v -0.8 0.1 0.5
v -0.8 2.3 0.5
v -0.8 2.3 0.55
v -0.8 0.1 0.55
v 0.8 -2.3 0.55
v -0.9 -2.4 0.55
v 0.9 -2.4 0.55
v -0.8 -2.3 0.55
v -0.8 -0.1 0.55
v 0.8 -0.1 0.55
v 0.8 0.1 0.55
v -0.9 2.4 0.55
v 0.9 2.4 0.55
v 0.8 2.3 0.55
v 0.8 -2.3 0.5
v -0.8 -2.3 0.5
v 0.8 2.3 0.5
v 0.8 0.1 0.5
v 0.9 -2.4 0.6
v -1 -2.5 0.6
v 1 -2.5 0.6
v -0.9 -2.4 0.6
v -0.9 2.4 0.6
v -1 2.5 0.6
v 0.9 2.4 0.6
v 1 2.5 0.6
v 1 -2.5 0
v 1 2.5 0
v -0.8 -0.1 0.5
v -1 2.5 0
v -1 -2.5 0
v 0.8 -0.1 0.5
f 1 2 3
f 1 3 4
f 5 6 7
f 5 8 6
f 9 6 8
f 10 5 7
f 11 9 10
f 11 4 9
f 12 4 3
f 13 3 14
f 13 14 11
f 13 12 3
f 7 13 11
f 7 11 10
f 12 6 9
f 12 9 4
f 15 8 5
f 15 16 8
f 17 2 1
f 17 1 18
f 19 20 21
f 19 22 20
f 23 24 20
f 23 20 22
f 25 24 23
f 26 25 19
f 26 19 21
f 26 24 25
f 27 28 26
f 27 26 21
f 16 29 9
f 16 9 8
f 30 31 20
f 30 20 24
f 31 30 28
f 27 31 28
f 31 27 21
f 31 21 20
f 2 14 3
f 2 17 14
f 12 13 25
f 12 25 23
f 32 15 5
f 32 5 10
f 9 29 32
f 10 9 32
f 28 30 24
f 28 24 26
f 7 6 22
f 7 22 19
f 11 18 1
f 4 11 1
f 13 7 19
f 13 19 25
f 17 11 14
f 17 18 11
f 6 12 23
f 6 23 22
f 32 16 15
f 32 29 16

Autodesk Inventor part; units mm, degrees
ref_plane "YZ Plane" through (0, 0, 0) normal (1, 0, 0) x (0, 1, 0)
ref_plane "XZ Plane" through (0, 0, 0) normal (0, 1, 0) x (-1, 0, 0)
ref_plane "XY Plane" through (0, 0, 0) normal (0, 0, 1) x (1, 0, 0)
sketch "草圖1" plane through (0, 0, 0) normal (0, 0, 1) x (1, 0, 0)
  line L0 (-1, 2.5) -> (1, 2.5)
  line L1 (1, 2.5) -> (1, -2.5)
  line L2 (1, -2.5) -> (-1, -2.5)
  line L3 (-1, -2.5) -> (-1, 2.5)
  line L4 (-1, 2.5) -> (1, -2.5) construction
  line L5 (1, 2.5) -> (-1, -2.5) construction
  line L6 (-0.8, -0.1) -> (0.8, -0.1)
  line L7 (1, -0.1) -> (1, 0.1)
  line L8 (0.8, 0.1) -> (-0.8, 0.1)
  line L9 (-1, 0.1) -> (-1, -0.1)
  line L10 (-1, -0.1) -> (1, 0.1) construction
  line L11 (1, -0.1) -> (-1, 0.1) construction
  line L12 (-0.8, -2.3) -> (0.8, -2.3)
  line L13 (0.8, 2.3) -> (-0.8, 2.3)
  line L14 (-0.8, 2.3) -> (0.8, -2.3) construction
  line L15 (-0.8, -2.3) -> (0.8, 2.3) construction
  line L16 (0.8, -2.3) -> (0.8, -0.08)
  line L17 (0.8, 0.08) -> (0.8, 2.3)
  line L18 (-0.8, 2.3) -> (-0.8, 0.08)
  line L19 (-0.8, -0.08) -> (-0.8, -2.3)
  line L20 (-1, -2.5) -> (1, -2.5)
  line L21 (1, -2.5) -> (1, -5.5)
  line L22 (1, -5.5) -> (-1, -5.5)
  line L23 (-1, -5.5) -> (-1, -2.5)
  line L24 (-0.9, -2.4) -> (0.9, -2.4)
  line L25 (0.9, -2.4) -> (0.9, 2.4)
  line L26 (0.9, 2.4) -> (-0.9, 2.4)
  line L27 (-0.9, 2.4) -> (-0.9, -2.4)
  line L28 (-0.9, -2.4) -> (0.9, 2.4) construction
  line L29 (0.9, -2.4) -> (-0.9, 2.4) construction
  point P0 (0, 0)
  dimension "d0" = 2
  dimension "d1" = 5
  dimension "d4" = 0.2
  dimension "d5" = 4.6
  dimension "d6" = 1.6
  dimension "d7" = 3
  dimension "d12" = 1.8
  dimension "d13" = 4.8
extrude "擠出4" add sketch "草圖1" along normal blind 0.6 contours L0 L1 L2 L3
extrude "擠出5" add sketch "草圖1" along normal blind 0.55 contours L27 L26 L25 L24
extrude "擠出6" add sketch "草圖1" along normal blind 0.5 contours L2 L21 L22 L23 | L6 L16 L12 L19 | L8 L18 L13 L17
sketch "草圖3" plane through (-1, -2.5, 0.6) normal (-1, 0, 0) x (0, 0, 1)
  line L0 (-0.6, 5) -> (-0.6, -3) projected
  line L1 (-0.6, -3) -> (-0.1, -3) projected
  line L2 (-0.1, 0) -> (-0.1, -3) projected
  line L3 (-0.1, 0) -> (0, 0) projected
  line L4 (0, 5) -> (0, 0) projected
  line L5 (-0.6, 5) -> (0, 5) projected
  line L6 (-0.6, 0) -> (-0.1, 0)
  line L7 (-0.1, 0) -> (-0.1, -3)
  line L8 (-0.1, -3) -> (-0.6, -3)
  line L9 (-0.6, -3) -> (-0.6, 0)
  point P0 (-0.6, 2.5)
extrude "擠出8" cut sketch "草圖3" against normal blind 2 contours L6 L2 L1 L0
properties part number "窗_無底" material "木材 (胡桃木)"
